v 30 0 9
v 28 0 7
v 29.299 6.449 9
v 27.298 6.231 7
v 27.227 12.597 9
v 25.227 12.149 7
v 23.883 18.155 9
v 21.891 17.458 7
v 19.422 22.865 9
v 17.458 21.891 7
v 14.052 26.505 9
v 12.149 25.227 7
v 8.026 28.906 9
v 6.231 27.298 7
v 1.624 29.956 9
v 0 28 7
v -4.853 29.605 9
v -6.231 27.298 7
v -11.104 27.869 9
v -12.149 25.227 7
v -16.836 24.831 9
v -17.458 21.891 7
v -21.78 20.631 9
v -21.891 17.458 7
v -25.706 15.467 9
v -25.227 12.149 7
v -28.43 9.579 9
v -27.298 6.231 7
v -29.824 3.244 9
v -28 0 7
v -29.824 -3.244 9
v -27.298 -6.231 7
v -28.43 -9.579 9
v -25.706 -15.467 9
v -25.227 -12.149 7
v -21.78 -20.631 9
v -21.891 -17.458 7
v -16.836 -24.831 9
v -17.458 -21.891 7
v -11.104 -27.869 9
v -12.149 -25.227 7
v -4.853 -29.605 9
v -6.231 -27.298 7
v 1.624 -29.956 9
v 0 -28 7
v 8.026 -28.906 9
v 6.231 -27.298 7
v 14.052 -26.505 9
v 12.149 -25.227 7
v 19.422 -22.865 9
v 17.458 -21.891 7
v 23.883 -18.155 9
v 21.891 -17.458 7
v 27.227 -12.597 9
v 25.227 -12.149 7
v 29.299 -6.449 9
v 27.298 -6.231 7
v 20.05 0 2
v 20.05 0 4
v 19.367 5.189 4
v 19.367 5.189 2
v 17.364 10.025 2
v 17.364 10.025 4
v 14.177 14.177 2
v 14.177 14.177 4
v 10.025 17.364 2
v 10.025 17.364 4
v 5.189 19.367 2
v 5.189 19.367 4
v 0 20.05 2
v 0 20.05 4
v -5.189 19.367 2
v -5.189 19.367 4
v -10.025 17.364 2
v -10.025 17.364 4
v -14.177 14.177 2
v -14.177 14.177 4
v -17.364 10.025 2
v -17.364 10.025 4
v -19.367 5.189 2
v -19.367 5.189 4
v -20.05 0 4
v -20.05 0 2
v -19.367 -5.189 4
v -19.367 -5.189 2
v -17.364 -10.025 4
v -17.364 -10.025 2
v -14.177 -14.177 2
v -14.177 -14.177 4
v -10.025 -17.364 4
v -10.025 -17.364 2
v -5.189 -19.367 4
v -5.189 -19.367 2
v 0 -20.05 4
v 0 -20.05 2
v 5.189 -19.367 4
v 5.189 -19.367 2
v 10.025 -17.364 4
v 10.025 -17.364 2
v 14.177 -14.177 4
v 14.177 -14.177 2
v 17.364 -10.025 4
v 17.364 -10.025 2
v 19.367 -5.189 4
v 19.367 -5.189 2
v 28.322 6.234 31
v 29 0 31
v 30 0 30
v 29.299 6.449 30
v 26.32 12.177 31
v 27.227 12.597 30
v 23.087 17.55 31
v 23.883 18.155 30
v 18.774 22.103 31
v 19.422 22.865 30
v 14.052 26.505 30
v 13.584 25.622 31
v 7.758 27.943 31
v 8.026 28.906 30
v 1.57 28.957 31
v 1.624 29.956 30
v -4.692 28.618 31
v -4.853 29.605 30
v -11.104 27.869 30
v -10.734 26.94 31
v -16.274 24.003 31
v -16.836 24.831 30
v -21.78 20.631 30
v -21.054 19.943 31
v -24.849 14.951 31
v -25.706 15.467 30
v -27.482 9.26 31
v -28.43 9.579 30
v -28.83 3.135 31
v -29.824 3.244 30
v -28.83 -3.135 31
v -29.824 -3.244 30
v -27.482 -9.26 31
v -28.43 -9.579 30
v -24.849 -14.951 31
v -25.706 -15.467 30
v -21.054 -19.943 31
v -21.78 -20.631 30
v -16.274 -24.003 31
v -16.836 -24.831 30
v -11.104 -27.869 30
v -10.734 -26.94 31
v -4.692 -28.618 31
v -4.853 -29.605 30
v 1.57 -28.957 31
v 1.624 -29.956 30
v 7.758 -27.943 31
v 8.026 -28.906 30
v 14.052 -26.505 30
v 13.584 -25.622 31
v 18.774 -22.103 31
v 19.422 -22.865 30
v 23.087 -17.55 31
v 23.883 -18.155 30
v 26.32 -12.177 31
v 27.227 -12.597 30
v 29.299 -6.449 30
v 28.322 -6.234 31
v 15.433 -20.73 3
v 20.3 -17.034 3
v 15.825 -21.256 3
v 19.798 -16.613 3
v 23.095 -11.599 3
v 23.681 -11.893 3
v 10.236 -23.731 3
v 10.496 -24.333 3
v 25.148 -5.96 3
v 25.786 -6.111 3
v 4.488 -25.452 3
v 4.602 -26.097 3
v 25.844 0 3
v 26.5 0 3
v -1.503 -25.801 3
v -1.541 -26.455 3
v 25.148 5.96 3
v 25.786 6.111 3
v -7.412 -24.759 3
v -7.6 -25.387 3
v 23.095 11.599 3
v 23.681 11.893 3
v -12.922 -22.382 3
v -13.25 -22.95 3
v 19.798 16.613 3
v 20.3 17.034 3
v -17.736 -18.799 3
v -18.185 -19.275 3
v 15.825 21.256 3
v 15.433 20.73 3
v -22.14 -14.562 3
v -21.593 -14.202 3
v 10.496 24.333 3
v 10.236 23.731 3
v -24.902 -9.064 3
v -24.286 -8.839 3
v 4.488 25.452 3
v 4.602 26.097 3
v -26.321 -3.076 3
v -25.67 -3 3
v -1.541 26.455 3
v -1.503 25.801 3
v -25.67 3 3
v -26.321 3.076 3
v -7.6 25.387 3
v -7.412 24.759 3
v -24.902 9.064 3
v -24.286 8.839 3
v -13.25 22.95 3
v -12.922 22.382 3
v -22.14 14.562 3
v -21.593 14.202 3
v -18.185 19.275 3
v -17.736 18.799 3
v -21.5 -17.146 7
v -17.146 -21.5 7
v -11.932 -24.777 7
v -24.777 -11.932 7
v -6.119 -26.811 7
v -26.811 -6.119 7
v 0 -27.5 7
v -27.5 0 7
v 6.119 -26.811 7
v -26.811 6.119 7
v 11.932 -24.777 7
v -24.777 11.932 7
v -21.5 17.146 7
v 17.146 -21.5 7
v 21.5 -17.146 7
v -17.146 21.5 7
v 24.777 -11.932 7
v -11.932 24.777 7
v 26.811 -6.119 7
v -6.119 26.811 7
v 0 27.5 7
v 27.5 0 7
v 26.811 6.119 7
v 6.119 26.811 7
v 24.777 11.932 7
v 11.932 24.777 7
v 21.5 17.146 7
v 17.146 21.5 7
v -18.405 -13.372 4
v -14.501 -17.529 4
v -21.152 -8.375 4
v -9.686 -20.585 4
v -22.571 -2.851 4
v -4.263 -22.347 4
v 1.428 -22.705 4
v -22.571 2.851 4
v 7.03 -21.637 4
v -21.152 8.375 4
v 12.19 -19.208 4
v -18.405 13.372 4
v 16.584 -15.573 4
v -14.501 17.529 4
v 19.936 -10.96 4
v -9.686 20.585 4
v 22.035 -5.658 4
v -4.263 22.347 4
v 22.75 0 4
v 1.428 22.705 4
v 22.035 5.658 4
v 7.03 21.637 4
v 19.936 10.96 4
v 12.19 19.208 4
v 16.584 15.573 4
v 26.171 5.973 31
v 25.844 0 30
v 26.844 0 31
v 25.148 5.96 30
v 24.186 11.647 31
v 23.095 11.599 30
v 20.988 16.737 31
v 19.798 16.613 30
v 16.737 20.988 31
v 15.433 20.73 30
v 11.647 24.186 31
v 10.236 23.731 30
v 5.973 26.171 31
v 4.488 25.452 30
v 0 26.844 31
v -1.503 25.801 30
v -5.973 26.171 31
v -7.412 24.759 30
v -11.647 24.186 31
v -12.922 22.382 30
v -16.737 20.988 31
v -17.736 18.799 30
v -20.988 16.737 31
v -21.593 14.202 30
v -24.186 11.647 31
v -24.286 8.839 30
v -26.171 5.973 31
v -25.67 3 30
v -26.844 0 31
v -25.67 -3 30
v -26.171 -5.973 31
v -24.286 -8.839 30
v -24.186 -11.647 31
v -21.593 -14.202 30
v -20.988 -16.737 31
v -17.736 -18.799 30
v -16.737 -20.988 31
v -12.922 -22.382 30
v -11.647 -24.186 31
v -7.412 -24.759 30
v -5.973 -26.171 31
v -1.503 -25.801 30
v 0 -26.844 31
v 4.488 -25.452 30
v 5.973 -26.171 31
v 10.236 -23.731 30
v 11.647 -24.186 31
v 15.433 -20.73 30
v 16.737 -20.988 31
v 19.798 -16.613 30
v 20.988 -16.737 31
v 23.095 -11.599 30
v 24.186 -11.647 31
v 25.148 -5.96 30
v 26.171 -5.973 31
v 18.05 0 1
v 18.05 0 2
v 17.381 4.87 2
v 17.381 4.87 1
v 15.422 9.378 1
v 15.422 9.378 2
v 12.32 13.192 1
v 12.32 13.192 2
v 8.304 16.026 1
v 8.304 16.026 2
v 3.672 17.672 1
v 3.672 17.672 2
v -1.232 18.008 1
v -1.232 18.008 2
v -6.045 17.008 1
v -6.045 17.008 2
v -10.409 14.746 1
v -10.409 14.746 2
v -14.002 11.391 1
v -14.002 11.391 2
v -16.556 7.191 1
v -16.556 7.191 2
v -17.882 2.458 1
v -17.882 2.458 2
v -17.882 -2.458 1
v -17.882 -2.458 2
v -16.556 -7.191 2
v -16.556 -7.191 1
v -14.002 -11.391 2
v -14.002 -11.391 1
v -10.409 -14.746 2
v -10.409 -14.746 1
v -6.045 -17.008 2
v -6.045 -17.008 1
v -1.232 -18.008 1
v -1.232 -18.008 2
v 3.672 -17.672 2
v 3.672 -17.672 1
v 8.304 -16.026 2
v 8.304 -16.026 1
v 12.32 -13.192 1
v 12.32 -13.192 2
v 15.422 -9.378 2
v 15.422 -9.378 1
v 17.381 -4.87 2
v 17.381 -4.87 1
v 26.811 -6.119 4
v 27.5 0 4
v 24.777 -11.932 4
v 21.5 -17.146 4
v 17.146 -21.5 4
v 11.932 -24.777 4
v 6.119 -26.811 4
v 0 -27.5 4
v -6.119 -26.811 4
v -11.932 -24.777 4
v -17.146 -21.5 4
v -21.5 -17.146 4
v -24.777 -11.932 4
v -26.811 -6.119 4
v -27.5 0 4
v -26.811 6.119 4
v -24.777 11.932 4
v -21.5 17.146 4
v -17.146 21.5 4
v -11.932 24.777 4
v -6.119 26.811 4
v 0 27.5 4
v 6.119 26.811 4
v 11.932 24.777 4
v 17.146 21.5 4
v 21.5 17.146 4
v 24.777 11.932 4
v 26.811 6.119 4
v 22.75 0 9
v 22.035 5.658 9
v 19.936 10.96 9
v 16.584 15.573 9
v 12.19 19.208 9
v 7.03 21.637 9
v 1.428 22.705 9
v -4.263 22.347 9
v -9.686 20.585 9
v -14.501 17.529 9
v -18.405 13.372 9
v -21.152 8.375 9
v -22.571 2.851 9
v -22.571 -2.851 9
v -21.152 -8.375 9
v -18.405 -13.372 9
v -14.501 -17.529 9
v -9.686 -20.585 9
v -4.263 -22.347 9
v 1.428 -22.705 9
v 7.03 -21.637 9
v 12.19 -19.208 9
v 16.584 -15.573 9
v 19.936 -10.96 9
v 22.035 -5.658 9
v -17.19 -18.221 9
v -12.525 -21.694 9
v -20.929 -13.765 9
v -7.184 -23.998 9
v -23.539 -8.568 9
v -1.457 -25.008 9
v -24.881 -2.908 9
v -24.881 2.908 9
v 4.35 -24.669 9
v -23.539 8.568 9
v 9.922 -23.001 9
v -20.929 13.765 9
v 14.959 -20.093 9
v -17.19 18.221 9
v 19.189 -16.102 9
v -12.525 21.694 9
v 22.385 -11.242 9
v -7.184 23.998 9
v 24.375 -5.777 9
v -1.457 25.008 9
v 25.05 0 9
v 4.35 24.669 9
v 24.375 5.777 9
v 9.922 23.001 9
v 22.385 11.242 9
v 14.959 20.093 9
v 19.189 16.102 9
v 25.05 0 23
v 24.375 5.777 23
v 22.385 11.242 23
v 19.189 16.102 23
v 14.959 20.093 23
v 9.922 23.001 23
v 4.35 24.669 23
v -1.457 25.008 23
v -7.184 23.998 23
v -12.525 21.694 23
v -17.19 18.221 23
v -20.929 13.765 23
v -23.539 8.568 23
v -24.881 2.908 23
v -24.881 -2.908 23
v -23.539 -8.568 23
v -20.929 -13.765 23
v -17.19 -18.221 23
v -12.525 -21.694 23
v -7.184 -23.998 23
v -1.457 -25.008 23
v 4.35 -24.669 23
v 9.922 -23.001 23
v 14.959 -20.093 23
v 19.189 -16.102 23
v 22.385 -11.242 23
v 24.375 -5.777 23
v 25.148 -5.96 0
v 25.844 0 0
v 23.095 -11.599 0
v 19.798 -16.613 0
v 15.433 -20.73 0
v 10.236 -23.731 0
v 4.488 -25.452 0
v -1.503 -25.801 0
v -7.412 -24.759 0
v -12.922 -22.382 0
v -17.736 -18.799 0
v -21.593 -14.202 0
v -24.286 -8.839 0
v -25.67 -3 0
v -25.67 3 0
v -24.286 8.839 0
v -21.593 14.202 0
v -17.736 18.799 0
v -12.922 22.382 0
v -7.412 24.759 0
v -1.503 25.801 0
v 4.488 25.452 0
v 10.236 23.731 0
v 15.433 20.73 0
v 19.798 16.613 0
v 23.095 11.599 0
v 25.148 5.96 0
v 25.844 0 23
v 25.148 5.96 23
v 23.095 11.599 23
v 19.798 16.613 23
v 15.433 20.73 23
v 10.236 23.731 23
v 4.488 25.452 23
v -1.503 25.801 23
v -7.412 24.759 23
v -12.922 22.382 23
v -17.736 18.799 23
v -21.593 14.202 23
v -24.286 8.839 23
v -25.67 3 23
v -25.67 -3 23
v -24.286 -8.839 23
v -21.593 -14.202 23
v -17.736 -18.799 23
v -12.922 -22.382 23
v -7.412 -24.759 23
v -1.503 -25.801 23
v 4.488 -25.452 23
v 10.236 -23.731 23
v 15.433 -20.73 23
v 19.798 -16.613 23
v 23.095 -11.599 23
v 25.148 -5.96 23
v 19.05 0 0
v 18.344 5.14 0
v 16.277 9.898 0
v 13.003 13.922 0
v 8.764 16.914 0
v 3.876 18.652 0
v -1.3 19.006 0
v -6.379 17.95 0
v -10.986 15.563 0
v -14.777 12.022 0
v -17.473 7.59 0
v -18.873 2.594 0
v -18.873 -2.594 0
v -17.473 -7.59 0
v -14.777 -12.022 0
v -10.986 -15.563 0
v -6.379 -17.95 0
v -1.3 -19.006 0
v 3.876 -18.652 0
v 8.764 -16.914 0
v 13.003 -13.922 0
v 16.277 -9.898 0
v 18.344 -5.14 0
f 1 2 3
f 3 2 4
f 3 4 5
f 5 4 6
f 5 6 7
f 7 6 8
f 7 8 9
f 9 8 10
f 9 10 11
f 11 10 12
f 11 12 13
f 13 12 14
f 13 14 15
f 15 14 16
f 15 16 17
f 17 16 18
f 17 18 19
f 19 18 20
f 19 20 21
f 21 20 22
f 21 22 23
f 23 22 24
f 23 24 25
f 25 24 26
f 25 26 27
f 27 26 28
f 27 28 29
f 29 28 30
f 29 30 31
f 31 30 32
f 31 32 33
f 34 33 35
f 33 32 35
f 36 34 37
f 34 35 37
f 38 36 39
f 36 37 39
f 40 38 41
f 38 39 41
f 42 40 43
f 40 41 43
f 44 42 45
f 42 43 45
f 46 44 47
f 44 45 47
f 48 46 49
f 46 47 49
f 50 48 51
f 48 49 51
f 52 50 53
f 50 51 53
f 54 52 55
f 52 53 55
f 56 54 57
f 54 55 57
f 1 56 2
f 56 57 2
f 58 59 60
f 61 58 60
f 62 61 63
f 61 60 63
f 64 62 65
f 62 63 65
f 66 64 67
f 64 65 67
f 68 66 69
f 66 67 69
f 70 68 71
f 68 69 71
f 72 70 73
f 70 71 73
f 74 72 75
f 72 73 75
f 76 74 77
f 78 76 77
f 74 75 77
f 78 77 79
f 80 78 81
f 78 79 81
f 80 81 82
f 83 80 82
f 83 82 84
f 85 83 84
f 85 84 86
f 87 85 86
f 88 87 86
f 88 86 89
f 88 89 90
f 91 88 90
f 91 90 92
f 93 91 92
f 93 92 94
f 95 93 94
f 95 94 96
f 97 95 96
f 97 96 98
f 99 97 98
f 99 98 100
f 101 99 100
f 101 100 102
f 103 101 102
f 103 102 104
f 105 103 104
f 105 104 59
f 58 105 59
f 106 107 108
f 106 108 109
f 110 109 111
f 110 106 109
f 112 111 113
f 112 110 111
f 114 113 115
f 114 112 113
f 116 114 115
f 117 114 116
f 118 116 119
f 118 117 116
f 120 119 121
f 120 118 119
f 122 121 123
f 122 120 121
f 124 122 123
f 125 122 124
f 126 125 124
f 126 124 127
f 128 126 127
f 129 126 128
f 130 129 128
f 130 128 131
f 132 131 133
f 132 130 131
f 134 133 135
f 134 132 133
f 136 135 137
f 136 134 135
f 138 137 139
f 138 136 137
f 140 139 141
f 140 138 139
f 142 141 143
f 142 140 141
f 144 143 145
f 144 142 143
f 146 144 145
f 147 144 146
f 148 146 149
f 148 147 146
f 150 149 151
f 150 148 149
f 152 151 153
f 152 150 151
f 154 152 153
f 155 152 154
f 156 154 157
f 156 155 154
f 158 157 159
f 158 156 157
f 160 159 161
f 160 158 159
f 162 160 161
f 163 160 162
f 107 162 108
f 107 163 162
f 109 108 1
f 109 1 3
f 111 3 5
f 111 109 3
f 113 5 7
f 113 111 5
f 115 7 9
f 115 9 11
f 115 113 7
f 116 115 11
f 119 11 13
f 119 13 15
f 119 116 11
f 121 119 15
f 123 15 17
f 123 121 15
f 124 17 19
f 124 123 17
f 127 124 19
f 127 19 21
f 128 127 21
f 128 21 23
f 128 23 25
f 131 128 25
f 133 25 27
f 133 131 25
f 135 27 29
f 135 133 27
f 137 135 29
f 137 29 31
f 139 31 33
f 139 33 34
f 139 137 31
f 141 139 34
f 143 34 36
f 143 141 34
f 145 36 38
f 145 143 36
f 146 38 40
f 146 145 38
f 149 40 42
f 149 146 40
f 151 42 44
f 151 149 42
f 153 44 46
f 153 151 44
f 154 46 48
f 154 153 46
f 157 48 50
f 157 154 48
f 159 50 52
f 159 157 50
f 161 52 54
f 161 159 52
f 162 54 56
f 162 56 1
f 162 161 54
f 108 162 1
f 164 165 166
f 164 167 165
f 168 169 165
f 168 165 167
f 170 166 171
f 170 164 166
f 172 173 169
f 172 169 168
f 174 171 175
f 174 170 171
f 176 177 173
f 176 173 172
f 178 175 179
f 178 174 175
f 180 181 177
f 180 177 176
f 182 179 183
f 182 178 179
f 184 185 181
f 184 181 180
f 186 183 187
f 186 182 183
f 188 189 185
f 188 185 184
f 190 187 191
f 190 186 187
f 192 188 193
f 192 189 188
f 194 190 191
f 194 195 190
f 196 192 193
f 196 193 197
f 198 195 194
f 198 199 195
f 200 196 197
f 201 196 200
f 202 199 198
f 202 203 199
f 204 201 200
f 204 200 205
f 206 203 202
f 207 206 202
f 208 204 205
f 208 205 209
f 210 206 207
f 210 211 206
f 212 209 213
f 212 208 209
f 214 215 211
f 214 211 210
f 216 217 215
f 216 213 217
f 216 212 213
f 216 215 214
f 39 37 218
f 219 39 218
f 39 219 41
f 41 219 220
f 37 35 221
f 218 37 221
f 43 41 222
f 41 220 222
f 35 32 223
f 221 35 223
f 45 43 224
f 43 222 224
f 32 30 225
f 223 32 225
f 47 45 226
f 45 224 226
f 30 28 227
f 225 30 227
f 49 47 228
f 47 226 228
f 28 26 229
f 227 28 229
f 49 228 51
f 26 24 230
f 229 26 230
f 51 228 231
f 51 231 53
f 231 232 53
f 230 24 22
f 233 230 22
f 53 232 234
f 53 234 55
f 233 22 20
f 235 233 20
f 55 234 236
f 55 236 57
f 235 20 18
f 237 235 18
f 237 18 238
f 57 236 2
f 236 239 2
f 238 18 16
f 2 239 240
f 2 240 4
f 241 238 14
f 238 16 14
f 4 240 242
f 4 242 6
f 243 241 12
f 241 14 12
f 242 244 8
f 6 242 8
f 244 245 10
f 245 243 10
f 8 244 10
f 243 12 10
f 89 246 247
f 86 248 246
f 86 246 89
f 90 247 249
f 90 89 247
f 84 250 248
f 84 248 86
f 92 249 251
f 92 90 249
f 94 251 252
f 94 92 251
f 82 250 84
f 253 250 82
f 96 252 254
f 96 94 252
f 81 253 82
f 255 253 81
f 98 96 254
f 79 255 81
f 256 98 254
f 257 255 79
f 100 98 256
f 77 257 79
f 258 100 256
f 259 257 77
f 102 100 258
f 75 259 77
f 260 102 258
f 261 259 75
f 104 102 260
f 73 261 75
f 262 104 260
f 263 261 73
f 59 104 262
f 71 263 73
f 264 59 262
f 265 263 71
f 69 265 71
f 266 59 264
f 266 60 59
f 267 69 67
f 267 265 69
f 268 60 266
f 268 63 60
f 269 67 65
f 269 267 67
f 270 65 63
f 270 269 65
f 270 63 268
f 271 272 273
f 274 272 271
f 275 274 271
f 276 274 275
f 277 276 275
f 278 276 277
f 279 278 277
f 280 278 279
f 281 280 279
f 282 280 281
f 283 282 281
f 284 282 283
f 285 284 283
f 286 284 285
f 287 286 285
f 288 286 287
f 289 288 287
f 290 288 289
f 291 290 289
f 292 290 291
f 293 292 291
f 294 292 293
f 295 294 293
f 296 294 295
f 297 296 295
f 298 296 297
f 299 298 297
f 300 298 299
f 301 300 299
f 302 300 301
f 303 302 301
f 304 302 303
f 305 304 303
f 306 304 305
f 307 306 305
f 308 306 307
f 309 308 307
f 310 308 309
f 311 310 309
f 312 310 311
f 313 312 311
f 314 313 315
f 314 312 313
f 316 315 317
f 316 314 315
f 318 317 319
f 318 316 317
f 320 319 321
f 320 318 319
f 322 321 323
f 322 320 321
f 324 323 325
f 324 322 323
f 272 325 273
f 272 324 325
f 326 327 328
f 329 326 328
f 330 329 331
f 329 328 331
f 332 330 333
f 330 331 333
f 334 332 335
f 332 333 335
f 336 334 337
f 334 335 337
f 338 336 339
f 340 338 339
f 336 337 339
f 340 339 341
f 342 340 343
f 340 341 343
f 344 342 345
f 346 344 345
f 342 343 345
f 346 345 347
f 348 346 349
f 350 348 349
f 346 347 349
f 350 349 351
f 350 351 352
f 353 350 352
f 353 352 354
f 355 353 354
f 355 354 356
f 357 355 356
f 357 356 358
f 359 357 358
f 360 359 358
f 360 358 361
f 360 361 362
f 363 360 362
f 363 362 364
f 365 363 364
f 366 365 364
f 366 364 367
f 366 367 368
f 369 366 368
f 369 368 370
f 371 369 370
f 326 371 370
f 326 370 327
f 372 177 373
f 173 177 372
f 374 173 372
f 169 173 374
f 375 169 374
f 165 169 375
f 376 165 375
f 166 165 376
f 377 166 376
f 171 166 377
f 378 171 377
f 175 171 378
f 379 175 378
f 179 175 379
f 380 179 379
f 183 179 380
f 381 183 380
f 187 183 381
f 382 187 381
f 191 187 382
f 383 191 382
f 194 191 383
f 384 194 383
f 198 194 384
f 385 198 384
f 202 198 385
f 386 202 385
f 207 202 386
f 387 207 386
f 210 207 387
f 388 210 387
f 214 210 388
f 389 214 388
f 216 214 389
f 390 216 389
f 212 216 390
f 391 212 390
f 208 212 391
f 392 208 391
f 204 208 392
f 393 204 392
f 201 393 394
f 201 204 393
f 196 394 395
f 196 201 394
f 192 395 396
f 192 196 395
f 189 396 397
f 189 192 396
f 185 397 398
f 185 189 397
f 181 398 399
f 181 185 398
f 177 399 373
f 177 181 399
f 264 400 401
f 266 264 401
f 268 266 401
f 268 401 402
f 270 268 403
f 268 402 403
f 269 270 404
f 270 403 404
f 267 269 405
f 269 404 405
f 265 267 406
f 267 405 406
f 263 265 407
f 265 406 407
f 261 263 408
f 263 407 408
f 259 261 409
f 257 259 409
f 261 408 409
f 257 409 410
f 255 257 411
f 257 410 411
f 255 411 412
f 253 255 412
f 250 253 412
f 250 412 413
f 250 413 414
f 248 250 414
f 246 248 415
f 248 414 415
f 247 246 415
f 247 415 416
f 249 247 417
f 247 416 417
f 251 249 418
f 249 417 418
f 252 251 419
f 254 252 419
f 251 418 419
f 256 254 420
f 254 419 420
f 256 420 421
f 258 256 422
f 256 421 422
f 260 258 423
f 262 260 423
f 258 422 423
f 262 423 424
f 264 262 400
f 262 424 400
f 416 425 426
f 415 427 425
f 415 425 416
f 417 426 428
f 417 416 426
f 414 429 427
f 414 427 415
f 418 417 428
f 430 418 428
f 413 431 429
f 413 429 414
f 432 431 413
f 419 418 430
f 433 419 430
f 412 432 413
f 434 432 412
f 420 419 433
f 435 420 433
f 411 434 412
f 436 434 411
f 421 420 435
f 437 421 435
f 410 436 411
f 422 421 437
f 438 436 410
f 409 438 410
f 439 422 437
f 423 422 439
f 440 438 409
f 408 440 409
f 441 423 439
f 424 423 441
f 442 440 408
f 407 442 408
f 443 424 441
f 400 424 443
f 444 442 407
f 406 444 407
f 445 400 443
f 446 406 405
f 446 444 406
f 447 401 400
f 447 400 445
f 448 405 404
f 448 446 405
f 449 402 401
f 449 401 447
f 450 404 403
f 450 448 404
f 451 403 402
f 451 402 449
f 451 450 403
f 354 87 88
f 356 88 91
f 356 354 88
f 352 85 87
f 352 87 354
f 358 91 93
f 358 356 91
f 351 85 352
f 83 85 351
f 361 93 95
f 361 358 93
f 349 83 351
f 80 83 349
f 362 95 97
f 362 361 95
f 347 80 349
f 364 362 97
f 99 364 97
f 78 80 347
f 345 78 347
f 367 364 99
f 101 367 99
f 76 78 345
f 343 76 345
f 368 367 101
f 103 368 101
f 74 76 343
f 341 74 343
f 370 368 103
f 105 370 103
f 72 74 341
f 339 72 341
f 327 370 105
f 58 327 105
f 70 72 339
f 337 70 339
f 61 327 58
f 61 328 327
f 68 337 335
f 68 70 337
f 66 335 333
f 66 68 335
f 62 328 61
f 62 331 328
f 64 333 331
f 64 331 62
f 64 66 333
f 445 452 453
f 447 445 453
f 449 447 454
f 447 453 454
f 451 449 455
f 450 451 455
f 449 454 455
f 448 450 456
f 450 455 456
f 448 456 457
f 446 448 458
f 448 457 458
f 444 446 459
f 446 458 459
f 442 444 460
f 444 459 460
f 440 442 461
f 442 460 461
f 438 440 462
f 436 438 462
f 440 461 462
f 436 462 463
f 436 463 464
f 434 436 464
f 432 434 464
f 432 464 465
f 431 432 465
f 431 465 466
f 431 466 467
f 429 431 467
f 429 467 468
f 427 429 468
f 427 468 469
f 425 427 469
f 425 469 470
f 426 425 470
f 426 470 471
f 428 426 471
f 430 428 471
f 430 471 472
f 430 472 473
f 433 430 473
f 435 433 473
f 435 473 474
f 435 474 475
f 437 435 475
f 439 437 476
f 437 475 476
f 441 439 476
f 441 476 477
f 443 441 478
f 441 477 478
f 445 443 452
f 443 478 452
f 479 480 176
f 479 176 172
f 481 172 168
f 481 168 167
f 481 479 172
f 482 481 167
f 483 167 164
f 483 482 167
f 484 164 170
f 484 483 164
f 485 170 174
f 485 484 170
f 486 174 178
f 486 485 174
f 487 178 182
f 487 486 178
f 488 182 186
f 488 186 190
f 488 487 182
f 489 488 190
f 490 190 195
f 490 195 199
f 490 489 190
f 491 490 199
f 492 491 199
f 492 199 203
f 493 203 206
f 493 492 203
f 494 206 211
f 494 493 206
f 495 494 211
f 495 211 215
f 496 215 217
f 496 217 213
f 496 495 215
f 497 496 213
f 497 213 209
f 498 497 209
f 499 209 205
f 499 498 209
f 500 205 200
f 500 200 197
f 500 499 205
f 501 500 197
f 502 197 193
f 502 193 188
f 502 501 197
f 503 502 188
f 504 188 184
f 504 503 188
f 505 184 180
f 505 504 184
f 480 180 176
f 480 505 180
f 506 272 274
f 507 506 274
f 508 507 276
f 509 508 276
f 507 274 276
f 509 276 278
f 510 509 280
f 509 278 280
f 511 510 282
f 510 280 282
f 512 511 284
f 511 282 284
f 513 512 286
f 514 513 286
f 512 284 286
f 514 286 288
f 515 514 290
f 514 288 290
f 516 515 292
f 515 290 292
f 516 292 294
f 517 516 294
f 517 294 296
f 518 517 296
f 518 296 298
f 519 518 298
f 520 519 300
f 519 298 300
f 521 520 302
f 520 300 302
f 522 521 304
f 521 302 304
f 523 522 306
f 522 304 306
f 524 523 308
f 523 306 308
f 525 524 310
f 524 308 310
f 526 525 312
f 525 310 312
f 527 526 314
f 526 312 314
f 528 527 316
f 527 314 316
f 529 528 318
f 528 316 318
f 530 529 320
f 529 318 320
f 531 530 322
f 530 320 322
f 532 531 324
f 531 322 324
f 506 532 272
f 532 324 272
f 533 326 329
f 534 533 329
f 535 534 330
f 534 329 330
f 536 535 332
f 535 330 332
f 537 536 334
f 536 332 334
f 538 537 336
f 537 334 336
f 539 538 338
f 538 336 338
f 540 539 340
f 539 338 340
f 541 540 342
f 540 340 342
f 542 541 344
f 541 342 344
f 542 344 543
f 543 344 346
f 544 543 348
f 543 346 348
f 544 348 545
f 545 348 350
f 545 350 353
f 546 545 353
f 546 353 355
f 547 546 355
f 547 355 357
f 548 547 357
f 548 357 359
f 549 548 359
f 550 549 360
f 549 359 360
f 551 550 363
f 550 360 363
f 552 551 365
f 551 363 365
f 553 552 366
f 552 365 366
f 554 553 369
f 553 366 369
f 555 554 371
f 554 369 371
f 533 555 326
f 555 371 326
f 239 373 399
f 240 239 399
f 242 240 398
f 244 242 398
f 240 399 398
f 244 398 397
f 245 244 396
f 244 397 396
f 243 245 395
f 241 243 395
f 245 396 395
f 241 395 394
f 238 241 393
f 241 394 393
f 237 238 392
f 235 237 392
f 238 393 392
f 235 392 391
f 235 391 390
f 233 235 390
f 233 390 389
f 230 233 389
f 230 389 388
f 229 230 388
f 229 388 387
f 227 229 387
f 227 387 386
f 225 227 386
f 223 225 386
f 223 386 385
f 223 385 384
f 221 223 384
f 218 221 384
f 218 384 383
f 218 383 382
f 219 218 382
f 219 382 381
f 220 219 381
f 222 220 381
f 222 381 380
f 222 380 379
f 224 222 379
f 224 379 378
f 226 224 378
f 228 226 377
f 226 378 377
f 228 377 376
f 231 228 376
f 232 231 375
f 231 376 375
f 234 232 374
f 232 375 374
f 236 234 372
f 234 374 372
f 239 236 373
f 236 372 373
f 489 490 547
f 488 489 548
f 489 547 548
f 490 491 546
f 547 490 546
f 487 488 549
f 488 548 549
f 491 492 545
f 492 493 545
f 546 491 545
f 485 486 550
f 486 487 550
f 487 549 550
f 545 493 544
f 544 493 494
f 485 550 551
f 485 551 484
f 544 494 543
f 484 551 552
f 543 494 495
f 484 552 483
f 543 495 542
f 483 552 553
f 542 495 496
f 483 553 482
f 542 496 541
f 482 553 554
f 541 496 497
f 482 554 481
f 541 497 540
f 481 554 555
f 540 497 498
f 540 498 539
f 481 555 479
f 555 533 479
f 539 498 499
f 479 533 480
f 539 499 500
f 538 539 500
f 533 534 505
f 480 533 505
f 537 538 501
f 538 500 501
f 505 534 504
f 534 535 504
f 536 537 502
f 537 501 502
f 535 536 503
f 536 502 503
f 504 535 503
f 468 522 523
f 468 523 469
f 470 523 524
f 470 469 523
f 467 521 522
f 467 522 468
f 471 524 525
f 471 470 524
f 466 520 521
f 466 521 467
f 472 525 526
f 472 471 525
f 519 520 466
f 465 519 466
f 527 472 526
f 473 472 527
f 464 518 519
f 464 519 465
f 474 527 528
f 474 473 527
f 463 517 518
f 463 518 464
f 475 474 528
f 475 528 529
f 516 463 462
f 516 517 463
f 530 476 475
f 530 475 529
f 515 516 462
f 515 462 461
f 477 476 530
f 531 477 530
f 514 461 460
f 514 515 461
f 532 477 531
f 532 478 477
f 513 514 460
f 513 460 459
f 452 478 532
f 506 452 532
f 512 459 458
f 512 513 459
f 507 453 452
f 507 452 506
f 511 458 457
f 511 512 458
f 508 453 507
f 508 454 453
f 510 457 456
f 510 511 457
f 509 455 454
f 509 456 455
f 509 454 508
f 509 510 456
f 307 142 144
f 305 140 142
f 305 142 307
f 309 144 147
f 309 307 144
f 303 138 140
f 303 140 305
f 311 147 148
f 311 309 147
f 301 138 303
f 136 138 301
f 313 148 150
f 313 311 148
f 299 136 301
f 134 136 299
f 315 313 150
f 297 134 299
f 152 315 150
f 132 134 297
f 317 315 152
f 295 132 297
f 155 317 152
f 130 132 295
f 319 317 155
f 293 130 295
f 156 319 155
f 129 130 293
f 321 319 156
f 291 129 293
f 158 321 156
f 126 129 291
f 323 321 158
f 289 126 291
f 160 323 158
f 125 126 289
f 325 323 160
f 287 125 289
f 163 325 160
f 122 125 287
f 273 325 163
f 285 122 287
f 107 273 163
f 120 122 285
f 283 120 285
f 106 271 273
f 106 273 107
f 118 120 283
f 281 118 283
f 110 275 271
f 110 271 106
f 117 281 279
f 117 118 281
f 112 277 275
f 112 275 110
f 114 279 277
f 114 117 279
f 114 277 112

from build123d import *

# Parameters (mm, degrees)
SKETCH1_R           = 27.5
BOSS_EXTRUDE1_DEPTH = 7
SKETCH4_R           = 20.05
CUT_EXTRUDE1_DEPTH  = 5
SKETCH5_R           = 18.05
CUT_EXTRUDE2_DEPTH  = 40.210967853
BOSS_EXTRUDE2_START = 24
SKETCH6_R           = 30
SKETCH6_R_2         = 20.05
BOSS_EXTRUDE2_DEPTH = 24
SKETCH7_R           = 25.05
CUT_EXTRUDE3_DEPTH  = 22
SKETCH8_R           = 22.75
CUT_EXTRUDE4_DEPTH  = 5
SKETCH9_R           = 25.8445
CUT_EXTRUDE5_DEPTH  = 8
SKETCH10_OUTSIDE_W  = 80.068
SKETCH10_OUTSIDE_H  = 80.068
SKETCH10_OUTSIDE_R  = 25.8445
CUT_EXTRUDE6_DEPTH  = 3
CHAMFER3_SIZE       = 2
CHAMFER4_SIZE       = 1
CHAMFER5_SIZE       = 1


with BuildPart() as part:
    # Sketch1 → Boss-Extrude1 (new body)
    with BuildSketch(Plane.XY):
        Circle(SKETCH1_R)
    extrude(amount=BOSS_EXTRUDE1_DEPTH)

    # Sketch4 → Cut-Extrude1 (cut)
    with BuildSketch(Plane.XY.offset(7)):
        Circle(SKETCH4_R)
    extrude(amount=-CUT_EXTRUDE1_DEPTH, mode=Mode.SUBTRACT)

    # Sketch5 → Cut-Extrude2 (cut, through all)
    with BuildSketch(Plane.XY.offset(2)):
        Circle(SKETCH5_R)
    extrude(amount=-CUT_EXTRUDE2_DEPTH, mode=Mode.SUBTRACT)

    # Sketch6 → Boss-Extrude2 (add)
    with BuildSketch(Plane.XY.offset(7).offset(BOSS_EXTRUDE2_START)):
        Circle(SKETCH6_R)
        Circle(SKETCH6_R_2, mode=Mode.SUBTRACT)
    extrude(amount=-BOSS_EXTRUDE2_DEPTH)

    # Sketch7 → Cut-Extrude3 (cut)
    with BuildSketch(Plane.XY.offset(31)):
        Circle(SKETCH7_R)
    extrude(amount=-CUT_EXTRUDE3_DEPTH, mode=Mode.SUBTRACT)

    # Sketch8 → Cut-Extrude4 (cut)
    with BuildSketch(Plane.XY.offset(9)):
        Circle(SKETCH8_R)
    extrude(amount=-CUT_EXTRUDE4_DEPTH, mode=Mode.SUBTRACT)

    # Sketch9 → Cut-Extrude5 (cut)
    with BuildSketch(Plane.XY.offset(31)):
        Circle(SKETCH9_R)
    extrude(amount=-CUT_EXTRUDE5_DEPTH, mode=Mode.SUBTRACT)

    # Sketch10 outside → Cut-Extrude6 (cut)
    with BuildSketch(Plane(origin=(0, 0, 0), x_dir=(-1, 0, 0), z_dir=(0, 0, -1))):
        Rectangle(SKETCH10_OUTSIDE_W, SKETCH10_OUTSIDE_H)
        with Locations(Location((0, 0, 0), (0, 0, 180))):
            Circle(SKETCH10_OUTSIDE_R, mode=Mode.SUBTRACT)
    extrude(amount=-CUT_EXTRUDE6_DEPTH, mode=Mode.SUBTRACT)

    # Chamfer3
    chamfer3_edges = [part.edges().sort_by_distance(p)[0] for p in [
        (-30, 0, 7),
    ]]
    chamfer(chamfer3_edges, length=CHAMFER3_SIZE)

    # Chamfer4
    chamfer4_edges = [part.edges().sort_by_distance(p)[0] for p in [
        (-27.5, 0, 3),
    ]]
    chamfer(chamfer4_edges, length=CHAMFER4_SIZE)

    # Chamfer5
    chamfer5_edges = [part.edges().sort_by_distance(p)[0] for p in [
        (-18.05, 0, 0),
        (-30, 0, 31),
        (-25.8445, 0, 31),
    ]]
    chamfer(chamfer5_edges, length=CHAMFER5_SIZE)


solid = part.part
